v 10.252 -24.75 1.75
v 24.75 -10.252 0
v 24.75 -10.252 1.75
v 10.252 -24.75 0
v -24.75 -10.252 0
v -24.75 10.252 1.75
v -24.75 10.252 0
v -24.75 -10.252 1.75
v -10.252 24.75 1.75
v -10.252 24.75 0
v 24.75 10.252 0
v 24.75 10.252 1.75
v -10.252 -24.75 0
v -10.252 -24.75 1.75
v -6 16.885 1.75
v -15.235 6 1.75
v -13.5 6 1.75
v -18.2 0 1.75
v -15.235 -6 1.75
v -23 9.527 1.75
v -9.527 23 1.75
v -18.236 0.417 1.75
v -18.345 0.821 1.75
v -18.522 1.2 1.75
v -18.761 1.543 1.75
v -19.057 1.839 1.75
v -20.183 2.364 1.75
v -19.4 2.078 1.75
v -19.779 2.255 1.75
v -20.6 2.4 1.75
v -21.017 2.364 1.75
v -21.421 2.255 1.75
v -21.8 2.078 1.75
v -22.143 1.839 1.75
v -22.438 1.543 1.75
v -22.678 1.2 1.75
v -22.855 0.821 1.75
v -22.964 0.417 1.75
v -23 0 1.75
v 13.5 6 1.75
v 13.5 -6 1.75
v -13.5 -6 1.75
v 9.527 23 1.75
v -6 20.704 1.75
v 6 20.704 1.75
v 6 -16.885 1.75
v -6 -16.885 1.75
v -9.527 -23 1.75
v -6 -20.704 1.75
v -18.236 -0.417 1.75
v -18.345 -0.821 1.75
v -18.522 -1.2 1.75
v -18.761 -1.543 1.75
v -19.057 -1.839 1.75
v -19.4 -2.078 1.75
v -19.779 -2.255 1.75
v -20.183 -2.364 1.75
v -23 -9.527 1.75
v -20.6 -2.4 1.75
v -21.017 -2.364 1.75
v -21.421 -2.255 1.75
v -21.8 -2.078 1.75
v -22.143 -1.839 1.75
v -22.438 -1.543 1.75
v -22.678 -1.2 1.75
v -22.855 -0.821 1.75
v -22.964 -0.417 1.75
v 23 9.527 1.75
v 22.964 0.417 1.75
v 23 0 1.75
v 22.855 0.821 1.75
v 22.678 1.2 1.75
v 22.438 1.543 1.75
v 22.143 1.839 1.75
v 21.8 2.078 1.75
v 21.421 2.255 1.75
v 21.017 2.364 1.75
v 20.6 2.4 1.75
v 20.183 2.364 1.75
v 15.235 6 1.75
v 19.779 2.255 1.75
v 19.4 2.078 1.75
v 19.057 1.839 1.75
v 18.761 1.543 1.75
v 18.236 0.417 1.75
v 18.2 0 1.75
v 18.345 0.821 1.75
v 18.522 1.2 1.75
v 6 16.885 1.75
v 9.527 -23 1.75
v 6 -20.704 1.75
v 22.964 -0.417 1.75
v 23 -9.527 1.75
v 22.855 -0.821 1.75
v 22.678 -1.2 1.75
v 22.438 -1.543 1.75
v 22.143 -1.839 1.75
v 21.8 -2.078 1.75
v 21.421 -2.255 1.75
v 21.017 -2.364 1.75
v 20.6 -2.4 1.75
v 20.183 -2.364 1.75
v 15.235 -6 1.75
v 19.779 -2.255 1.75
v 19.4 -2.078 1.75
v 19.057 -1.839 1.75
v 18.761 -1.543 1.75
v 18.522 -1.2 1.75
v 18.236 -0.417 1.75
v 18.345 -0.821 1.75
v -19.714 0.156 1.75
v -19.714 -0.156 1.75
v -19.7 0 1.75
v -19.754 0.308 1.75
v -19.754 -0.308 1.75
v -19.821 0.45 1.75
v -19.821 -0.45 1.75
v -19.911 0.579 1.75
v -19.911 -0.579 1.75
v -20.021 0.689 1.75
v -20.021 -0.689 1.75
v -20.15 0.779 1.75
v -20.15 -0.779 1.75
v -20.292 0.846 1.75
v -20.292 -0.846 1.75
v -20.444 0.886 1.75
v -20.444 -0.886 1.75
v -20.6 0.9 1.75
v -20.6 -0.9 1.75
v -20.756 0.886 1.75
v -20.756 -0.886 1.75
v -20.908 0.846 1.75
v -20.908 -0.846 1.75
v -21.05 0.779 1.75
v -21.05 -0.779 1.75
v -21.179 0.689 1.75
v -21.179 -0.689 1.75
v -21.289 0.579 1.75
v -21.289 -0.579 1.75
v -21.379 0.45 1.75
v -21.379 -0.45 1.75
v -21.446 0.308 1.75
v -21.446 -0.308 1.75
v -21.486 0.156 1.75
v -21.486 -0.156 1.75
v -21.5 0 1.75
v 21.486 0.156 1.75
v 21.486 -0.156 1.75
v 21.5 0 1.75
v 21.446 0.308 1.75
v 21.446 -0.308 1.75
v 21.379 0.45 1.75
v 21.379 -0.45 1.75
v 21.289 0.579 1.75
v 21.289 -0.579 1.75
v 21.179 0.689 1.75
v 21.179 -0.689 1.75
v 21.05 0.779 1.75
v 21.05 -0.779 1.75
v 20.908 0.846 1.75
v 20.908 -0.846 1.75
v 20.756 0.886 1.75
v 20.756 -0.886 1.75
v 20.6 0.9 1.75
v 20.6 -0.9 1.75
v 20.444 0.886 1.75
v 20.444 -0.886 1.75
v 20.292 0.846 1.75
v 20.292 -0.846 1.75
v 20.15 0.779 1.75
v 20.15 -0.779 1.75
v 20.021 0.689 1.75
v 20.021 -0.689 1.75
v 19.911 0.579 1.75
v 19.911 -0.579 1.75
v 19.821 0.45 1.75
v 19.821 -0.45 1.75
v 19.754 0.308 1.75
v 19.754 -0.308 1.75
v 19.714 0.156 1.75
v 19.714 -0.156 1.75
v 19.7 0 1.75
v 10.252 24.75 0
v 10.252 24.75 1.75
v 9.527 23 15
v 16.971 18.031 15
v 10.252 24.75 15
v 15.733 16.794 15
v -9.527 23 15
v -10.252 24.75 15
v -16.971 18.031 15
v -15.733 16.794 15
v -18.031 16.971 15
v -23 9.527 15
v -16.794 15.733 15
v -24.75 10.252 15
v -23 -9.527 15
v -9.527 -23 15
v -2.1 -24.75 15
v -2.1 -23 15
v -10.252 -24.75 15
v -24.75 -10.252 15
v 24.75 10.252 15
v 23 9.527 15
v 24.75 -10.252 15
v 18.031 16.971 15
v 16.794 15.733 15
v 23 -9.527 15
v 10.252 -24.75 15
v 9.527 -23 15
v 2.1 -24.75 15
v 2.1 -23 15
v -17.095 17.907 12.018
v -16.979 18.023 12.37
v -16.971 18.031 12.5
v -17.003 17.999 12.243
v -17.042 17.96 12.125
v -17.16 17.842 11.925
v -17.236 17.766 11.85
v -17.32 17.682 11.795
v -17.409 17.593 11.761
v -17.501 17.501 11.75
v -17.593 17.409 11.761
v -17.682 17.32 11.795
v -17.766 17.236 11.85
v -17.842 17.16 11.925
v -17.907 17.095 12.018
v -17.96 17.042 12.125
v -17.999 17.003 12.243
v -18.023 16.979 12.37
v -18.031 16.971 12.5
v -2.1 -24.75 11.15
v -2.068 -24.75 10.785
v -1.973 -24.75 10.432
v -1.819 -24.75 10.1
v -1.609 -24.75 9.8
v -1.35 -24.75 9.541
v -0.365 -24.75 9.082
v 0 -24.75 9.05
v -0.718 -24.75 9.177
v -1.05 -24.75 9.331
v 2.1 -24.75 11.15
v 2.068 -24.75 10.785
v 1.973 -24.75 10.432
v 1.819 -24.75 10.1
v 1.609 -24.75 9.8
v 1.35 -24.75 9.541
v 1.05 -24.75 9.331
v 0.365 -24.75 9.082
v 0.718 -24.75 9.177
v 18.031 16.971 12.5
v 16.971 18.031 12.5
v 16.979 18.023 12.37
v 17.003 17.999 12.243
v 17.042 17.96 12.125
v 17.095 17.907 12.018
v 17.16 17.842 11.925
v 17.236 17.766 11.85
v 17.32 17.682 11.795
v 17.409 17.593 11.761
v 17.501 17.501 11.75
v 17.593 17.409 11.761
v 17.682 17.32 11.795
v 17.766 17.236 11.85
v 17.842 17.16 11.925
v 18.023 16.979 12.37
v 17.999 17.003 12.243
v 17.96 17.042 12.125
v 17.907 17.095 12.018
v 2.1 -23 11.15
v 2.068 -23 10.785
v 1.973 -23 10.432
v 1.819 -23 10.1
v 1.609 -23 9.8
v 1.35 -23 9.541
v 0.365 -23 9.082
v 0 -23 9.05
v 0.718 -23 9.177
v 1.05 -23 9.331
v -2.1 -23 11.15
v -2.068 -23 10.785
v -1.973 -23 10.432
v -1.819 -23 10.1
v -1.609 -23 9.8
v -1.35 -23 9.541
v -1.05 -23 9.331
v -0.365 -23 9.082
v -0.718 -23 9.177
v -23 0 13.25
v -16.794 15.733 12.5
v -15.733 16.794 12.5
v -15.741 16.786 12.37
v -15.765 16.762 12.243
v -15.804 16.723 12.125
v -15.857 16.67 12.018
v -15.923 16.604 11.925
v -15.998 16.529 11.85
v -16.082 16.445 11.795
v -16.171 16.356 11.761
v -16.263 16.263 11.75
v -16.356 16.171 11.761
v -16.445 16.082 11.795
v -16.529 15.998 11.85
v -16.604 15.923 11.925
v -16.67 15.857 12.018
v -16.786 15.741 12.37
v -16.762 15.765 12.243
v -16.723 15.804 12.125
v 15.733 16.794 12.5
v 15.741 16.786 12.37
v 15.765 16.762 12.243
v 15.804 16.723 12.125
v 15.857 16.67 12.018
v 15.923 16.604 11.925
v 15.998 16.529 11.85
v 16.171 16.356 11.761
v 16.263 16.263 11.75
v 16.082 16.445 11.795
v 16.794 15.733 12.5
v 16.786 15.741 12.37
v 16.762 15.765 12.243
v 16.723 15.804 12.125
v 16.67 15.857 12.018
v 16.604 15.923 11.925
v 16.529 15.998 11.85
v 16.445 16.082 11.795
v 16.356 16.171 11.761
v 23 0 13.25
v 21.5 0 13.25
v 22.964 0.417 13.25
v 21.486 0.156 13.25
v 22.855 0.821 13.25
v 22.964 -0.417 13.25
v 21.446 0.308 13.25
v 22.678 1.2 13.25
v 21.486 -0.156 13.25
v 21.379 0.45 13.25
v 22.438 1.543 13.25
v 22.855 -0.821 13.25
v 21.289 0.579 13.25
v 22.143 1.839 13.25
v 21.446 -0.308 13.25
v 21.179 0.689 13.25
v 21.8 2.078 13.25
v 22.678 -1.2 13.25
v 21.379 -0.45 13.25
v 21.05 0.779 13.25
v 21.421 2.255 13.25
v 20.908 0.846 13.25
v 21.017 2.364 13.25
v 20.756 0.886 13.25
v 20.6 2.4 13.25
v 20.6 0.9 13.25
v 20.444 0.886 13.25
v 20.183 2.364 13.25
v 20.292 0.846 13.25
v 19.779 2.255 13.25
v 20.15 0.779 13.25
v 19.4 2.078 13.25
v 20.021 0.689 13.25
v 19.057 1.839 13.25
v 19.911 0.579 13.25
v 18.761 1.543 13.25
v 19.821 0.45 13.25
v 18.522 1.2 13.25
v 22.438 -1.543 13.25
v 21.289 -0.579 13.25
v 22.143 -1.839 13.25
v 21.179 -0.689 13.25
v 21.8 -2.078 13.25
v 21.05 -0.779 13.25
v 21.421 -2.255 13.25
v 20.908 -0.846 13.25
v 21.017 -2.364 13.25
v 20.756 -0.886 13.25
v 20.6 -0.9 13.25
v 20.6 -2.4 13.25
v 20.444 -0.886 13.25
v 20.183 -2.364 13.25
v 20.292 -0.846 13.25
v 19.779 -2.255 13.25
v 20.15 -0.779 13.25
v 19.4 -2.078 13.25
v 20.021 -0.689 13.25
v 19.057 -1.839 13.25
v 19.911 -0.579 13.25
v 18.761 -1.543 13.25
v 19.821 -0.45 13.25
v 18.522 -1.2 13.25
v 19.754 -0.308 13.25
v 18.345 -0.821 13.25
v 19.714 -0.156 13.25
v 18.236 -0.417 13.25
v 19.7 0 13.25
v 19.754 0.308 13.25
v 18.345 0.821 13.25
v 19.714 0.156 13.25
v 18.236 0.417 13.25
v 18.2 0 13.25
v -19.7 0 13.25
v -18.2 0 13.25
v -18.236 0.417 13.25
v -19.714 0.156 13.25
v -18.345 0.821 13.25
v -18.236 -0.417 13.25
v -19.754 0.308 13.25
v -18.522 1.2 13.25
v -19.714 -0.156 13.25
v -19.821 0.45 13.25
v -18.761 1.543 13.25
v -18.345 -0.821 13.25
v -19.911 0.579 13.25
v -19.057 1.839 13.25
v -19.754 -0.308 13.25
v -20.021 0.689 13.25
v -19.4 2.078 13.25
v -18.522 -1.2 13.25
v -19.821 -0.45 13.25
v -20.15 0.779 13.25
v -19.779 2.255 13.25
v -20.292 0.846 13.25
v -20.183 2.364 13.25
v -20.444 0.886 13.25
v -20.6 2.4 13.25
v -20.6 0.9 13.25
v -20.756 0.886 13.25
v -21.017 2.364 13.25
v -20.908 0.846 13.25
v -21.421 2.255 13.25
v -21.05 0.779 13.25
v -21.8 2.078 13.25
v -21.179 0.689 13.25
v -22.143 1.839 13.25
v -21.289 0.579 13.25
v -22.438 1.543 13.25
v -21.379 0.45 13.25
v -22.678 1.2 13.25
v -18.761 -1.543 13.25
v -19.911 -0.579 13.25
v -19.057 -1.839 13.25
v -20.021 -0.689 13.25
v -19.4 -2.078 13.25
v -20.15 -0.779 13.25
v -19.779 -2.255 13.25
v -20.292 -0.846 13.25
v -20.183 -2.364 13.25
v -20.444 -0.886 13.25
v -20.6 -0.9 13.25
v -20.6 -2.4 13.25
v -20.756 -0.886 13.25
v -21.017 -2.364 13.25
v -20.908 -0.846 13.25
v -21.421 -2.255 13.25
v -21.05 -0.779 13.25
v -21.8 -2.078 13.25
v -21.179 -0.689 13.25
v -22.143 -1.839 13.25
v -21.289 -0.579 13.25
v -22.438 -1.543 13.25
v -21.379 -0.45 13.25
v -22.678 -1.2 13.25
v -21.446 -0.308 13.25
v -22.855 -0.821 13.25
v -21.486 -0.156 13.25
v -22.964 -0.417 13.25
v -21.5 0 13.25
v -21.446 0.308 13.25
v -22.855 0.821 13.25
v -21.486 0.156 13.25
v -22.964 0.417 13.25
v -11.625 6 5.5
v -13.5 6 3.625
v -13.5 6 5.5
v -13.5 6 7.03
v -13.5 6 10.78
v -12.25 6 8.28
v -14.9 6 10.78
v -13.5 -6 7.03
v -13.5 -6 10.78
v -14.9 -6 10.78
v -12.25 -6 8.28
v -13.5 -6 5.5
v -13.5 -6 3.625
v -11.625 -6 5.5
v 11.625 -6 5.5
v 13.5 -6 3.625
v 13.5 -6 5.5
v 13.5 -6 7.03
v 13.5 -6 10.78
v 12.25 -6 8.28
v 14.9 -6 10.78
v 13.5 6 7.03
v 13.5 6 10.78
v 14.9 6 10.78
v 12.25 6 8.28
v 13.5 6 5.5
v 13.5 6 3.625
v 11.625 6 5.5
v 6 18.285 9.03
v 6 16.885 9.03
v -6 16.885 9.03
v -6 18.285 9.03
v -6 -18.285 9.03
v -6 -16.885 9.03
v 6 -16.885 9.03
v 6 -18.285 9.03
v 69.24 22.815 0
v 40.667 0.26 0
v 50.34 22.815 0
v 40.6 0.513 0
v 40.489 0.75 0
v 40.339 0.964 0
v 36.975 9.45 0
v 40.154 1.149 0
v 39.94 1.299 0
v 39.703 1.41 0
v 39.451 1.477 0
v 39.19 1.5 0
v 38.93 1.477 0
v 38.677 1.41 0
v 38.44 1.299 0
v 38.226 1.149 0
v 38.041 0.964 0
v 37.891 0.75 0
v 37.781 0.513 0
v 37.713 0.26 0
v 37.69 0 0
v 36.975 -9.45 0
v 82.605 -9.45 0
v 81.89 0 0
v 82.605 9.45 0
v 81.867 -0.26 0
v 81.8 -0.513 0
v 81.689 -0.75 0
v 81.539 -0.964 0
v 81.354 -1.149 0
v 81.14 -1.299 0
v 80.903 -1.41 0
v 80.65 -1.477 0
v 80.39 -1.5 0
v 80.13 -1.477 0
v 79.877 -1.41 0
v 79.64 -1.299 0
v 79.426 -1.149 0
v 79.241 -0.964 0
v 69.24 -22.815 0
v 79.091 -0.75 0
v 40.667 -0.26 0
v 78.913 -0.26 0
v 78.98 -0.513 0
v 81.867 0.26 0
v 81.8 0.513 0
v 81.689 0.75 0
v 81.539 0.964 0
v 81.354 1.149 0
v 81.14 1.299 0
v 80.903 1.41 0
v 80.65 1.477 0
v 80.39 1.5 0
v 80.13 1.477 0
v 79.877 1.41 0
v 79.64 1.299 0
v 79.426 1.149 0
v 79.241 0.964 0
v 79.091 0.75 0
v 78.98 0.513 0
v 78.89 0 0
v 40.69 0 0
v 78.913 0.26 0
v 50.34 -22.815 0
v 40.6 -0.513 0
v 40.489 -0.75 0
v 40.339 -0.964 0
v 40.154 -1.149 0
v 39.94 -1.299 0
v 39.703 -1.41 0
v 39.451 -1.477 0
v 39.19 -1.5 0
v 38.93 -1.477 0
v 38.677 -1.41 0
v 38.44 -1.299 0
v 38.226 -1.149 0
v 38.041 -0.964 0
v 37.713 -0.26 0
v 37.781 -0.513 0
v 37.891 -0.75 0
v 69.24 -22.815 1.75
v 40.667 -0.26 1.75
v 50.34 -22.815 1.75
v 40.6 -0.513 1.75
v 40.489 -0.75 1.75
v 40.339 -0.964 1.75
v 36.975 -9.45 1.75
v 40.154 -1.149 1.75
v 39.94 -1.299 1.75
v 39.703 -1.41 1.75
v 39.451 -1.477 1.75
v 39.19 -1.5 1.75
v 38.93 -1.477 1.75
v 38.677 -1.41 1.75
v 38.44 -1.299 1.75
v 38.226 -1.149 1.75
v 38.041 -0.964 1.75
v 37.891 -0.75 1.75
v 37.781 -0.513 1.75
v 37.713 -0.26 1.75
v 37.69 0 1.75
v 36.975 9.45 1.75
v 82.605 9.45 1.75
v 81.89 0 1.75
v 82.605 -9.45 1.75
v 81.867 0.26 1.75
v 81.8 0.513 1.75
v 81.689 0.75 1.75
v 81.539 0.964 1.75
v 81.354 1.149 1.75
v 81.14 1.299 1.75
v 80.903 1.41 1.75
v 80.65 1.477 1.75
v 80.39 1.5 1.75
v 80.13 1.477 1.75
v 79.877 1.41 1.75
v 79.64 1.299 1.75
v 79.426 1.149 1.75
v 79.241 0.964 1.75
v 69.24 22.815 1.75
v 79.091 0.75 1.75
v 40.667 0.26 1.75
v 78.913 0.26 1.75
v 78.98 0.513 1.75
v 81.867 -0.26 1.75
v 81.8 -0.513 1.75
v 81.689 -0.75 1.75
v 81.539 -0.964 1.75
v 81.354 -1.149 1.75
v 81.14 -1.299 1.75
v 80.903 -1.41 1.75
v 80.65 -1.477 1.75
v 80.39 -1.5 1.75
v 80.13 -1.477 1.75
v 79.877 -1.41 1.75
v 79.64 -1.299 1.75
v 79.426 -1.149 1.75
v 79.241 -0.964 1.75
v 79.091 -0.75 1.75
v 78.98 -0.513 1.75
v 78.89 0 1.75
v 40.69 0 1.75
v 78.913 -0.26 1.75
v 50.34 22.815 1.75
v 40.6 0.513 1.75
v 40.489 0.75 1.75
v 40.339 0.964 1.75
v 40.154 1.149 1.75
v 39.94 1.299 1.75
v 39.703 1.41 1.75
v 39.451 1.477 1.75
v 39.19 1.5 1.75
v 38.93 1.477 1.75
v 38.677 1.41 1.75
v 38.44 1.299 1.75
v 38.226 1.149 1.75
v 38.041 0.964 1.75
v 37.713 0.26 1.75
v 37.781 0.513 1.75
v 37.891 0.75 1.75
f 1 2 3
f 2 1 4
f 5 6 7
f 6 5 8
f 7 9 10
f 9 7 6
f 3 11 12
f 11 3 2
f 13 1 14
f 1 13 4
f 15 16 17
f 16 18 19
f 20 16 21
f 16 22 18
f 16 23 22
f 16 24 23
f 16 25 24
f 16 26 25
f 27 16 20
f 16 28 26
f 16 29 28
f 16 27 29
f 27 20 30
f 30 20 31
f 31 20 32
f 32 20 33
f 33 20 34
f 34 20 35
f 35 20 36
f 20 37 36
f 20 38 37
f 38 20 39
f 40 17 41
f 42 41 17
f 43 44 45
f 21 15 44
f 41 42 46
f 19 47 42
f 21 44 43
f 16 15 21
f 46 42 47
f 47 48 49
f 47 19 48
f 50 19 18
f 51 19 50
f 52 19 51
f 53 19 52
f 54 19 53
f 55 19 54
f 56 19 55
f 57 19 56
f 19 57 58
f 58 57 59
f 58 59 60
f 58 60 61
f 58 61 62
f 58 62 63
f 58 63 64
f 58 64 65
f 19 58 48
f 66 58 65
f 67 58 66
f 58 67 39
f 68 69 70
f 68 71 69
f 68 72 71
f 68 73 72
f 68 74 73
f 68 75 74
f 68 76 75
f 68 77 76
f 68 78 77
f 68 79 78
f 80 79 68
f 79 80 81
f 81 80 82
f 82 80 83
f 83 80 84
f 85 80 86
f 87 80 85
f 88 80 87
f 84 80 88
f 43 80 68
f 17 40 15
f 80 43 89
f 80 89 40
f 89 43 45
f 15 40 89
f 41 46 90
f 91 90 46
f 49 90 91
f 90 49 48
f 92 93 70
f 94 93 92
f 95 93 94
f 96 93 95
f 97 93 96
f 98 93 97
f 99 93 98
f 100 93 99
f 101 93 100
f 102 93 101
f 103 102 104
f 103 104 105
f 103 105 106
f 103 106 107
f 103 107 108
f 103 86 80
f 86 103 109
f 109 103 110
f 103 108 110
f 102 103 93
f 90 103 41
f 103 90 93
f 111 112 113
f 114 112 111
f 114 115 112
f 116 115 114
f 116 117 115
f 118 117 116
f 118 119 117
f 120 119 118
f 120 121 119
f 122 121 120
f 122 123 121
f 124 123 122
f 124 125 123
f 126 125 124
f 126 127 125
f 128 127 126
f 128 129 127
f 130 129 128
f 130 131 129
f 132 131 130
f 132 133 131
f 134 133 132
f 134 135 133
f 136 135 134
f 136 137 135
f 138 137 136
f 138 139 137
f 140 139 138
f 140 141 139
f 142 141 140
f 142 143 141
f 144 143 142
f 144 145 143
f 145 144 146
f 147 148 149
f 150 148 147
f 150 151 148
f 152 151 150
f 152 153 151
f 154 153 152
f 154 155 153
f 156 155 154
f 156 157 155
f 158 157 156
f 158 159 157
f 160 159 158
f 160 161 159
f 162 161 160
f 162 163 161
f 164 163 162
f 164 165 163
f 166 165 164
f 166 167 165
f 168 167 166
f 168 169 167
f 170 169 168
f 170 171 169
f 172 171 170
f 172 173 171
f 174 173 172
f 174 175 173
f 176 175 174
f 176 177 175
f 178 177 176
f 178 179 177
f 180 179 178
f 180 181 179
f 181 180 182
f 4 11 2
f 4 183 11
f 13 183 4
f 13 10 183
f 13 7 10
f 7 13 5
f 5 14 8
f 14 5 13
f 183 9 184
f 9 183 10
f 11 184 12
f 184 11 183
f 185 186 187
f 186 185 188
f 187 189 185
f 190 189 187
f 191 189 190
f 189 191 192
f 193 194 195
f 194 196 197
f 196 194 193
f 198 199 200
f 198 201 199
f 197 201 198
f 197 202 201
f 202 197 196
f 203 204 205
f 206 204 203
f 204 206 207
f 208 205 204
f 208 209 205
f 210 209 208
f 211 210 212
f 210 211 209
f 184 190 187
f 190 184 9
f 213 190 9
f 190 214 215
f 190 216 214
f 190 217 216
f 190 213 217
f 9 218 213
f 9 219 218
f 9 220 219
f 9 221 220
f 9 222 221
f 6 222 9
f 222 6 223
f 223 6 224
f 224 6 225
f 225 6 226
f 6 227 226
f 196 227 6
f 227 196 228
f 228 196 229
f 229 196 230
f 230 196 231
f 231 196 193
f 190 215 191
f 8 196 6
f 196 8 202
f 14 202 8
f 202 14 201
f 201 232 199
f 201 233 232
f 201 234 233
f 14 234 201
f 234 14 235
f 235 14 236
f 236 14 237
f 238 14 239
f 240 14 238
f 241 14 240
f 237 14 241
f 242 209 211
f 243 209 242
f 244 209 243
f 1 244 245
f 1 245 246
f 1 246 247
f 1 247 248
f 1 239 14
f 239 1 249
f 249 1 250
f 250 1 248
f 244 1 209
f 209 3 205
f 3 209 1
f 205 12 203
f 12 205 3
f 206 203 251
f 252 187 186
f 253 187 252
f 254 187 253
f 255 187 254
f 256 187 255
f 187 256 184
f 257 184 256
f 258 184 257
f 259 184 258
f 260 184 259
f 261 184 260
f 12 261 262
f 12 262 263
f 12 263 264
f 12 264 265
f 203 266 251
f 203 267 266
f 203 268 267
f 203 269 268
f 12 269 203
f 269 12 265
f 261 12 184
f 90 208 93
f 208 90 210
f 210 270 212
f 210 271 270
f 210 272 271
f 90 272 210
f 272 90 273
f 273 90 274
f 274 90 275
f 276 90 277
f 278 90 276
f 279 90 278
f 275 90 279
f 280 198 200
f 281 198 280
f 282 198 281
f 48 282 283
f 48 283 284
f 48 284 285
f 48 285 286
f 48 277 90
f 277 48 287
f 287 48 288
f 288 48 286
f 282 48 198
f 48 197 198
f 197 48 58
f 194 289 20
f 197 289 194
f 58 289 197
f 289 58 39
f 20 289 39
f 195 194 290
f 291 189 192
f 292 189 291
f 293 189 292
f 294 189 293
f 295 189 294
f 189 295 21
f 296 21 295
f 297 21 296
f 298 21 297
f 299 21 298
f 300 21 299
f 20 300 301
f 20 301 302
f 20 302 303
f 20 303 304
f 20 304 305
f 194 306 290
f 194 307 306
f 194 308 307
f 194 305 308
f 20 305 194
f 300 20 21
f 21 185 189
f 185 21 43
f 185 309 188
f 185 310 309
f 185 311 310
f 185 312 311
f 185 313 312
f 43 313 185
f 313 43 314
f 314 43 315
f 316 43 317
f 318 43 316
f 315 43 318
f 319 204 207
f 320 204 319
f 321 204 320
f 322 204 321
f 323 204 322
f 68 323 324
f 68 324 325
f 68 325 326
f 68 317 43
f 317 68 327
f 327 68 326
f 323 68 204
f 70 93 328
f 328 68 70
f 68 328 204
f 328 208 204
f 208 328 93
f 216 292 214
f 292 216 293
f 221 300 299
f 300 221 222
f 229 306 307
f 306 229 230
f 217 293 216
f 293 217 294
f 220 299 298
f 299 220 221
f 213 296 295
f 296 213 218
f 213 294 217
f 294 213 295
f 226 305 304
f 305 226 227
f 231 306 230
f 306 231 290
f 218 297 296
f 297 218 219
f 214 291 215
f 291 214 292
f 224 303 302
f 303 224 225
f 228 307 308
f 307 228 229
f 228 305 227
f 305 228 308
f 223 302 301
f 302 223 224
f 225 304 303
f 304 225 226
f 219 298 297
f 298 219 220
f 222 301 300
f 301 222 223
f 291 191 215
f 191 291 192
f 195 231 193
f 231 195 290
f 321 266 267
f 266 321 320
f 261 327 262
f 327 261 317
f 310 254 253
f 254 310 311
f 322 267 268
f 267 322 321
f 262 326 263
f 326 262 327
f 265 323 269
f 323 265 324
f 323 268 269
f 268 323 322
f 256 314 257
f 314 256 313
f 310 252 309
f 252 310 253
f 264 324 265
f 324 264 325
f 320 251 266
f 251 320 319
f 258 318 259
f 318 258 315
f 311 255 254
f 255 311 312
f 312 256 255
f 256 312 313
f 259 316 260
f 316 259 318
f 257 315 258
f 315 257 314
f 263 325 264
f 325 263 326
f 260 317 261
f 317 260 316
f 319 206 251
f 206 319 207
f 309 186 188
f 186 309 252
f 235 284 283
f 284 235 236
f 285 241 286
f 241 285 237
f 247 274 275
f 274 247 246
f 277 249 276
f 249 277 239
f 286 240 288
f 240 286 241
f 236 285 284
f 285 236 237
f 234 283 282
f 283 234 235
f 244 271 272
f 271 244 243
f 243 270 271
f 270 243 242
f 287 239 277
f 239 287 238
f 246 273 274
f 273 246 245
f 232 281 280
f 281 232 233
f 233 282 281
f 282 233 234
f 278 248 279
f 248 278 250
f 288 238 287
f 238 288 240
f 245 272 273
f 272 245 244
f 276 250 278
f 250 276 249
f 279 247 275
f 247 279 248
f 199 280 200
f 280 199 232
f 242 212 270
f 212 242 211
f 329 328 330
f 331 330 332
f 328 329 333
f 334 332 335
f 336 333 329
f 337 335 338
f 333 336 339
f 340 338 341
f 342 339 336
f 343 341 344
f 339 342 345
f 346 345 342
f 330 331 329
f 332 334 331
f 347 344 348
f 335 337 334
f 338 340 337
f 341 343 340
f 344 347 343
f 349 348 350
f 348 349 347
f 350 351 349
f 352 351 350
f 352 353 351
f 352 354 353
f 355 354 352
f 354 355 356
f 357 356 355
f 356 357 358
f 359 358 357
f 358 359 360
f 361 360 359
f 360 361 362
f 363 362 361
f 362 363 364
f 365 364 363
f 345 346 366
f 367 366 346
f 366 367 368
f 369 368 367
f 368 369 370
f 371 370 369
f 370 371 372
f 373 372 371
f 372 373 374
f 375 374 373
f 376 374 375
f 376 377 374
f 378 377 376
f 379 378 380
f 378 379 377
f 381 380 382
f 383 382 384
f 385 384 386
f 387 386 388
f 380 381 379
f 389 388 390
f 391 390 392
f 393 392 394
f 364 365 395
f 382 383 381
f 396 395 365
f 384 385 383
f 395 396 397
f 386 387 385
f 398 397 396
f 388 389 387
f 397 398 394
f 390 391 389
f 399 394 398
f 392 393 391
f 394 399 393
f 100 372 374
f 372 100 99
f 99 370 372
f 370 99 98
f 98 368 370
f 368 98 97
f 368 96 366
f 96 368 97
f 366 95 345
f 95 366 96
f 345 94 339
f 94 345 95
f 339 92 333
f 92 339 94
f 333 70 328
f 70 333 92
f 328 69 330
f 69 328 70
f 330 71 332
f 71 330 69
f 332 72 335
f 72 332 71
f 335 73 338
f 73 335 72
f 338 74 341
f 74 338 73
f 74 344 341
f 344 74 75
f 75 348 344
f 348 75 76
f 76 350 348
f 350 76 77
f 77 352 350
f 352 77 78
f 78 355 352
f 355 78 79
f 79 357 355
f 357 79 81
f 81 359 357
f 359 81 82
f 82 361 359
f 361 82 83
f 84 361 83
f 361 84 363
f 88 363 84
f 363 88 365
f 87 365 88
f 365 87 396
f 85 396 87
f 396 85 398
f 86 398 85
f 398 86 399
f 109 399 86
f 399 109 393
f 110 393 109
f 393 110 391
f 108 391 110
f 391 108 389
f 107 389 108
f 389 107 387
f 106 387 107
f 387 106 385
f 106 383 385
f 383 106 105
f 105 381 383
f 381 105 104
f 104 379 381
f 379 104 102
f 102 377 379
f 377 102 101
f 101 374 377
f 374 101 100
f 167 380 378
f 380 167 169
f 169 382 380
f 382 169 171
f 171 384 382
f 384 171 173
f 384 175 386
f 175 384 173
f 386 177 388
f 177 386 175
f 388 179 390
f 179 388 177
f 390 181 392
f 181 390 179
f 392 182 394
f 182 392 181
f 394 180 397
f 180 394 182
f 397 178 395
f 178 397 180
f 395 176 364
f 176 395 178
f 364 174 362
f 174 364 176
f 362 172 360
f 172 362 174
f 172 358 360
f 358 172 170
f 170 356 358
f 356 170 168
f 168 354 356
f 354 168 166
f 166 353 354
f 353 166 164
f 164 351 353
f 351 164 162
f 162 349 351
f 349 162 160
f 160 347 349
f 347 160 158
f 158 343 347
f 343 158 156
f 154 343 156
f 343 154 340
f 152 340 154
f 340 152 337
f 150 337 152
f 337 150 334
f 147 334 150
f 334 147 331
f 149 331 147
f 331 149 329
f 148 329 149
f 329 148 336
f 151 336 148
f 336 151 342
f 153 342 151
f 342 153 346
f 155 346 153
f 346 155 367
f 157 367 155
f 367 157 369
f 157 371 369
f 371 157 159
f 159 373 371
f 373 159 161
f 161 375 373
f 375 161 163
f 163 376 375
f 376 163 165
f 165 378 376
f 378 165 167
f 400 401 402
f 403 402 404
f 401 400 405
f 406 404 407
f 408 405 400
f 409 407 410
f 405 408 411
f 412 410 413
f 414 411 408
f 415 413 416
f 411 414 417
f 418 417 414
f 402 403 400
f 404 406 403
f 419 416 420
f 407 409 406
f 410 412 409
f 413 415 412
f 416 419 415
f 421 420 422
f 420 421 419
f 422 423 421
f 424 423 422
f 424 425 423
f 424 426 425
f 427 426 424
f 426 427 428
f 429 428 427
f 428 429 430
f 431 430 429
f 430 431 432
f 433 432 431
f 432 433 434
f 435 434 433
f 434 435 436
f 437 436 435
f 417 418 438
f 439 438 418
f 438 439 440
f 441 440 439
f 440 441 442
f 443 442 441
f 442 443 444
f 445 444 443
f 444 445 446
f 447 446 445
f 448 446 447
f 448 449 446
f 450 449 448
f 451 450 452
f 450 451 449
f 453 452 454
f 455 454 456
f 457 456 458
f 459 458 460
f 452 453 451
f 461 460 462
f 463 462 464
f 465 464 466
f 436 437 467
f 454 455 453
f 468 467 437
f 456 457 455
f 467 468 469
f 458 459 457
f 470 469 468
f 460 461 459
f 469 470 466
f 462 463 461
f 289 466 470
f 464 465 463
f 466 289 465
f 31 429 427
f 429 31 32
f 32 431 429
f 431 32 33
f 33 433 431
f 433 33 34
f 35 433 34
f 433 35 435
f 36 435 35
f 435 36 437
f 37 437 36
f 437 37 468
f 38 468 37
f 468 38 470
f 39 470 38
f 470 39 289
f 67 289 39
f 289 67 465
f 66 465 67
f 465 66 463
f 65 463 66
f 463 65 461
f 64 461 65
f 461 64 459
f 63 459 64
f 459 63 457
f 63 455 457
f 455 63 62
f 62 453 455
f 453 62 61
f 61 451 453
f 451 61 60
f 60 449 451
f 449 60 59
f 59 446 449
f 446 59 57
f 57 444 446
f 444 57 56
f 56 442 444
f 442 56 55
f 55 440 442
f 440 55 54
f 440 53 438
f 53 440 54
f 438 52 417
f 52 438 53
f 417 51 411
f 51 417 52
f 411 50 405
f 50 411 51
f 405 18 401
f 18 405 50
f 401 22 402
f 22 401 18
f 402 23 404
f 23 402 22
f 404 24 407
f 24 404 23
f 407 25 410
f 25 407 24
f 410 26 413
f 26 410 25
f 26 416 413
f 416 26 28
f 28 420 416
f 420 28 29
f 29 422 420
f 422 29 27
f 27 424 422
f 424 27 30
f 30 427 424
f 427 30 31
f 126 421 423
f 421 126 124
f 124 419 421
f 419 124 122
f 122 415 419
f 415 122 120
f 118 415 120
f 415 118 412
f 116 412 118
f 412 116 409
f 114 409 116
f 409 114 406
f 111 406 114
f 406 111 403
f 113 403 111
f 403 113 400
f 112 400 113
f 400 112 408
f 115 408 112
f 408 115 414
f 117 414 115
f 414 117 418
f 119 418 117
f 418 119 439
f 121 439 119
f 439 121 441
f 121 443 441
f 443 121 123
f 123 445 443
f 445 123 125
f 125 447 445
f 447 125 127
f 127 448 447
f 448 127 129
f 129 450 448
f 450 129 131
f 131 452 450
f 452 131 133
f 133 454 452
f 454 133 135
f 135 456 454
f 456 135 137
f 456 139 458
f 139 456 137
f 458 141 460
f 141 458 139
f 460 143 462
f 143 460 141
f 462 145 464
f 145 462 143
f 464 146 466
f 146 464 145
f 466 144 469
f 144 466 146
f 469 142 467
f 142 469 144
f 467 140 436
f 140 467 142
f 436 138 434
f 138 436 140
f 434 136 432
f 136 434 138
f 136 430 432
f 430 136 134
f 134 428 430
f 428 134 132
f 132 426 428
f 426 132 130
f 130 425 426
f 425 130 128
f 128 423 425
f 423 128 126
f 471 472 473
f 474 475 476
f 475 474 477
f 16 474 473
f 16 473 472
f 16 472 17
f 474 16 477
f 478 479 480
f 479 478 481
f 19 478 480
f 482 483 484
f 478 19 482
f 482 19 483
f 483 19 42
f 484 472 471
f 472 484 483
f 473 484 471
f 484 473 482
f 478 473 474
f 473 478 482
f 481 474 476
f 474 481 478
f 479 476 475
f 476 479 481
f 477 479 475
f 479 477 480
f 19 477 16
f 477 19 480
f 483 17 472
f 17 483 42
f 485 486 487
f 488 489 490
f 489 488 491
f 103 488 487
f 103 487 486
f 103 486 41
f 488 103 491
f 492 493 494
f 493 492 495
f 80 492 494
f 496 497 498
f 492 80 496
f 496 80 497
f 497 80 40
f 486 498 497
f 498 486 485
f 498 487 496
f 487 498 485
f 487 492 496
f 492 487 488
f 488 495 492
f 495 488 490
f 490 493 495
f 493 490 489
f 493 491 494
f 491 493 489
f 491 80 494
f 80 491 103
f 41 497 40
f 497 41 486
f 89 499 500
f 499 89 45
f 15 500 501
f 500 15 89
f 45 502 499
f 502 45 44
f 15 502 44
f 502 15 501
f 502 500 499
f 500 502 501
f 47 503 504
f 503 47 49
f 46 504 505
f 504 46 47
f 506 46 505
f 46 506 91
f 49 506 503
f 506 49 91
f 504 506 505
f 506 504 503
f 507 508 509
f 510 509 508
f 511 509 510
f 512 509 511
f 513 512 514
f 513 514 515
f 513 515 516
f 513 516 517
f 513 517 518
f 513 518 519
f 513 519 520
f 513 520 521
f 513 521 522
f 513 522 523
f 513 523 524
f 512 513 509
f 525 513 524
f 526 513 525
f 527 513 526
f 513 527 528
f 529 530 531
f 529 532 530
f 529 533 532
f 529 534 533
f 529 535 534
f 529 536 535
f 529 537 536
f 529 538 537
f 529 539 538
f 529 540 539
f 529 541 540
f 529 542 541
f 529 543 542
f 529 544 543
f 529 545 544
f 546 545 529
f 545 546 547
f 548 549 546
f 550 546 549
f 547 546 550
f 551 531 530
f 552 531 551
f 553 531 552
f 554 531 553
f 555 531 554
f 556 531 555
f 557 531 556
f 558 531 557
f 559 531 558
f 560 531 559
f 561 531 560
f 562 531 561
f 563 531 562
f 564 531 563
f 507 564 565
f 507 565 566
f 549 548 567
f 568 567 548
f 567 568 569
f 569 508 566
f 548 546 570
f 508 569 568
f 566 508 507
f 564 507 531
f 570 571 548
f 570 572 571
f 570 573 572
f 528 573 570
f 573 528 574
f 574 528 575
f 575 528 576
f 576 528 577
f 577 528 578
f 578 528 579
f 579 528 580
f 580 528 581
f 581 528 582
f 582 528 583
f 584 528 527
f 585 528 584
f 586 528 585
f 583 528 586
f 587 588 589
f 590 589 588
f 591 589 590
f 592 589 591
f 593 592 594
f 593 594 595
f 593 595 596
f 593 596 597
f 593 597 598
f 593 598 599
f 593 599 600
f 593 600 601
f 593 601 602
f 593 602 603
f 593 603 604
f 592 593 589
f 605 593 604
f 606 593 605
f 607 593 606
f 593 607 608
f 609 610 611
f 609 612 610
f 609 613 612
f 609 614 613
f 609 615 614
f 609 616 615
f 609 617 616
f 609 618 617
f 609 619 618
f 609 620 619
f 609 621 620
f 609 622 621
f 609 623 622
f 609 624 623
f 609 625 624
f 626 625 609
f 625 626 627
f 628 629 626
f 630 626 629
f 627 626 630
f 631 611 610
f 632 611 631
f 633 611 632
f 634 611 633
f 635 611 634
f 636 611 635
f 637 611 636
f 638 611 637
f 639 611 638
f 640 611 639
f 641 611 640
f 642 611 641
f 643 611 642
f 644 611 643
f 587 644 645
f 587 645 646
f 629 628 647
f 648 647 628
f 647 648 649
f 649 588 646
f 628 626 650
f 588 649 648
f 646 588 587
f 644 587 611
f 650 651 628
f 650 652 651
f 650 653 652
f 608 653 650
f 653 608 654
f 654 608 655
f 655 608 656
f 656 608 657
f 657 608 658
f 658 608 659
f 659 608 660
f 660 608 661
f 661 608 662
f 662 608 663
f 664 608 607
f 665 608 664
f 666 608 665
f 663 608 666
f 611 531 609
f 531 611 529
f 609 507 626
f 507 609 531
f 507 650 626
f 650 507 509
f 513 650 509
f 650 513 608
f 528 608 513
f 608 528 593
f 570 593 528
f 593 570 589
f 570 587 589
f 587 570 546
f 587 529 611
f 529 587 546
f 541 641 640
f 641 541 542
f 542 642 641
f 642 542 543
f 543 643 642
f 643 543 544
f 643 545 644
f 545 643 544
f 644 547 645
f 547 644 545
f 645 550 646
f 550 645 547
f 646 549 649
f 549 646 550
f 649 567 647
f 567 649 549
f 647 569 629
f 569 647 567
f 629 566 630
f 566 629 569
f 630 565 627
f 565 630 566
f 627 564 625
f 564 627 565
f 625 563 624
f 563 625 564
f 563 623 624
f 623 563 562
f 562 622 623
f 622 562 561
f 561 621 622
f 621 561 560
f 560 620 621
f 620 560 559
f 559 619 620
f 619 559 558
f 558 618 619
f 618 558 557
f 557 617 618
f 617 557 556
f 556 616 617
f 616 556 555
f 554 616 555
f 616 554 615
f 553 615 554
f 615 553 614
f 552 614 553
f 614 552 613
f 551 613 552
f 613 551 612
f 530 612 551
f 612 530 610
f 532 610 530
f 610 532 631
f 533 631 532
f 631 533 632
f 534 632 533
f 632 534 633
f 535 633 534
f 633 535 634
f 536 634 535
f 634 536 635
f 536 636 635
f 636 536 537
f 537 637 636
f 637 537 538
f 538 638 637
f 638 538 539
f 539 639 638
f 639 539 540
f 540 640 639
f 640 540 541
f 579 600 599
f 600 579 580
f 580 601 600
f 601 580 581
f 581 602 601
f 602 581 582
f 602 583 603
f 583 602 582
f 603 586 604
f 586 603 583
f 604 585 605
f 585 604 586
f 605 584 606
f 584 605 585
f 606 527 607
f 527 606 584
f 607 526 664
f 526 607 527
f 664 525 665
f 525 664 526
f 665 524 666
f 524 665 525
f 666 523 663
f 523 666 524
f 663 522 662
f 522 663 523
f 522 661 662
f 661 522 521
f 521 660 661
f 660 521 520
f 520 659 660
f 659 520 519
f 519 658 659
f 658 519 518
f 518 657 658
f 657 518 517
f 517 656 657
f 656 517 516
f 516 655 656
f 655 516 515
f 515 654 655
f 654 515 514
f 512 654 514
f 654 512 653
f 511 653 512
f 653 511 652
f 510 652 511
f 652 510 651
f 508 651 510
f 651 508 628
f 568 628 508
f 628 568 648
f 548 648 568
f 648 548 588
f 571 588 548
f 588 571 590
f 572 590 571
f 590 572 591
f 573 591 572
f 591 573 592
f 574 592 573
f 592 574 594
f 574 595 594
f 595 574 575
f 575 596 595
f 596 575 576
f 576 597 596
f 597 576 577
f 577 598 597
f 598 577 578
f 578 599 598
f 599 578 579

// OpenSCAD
includeLid = true;
includeBox = true;

snapSpacing = 27;
pcbLength = 33.77;
pcbThickness = 1.53;

offsetFromBase = 3.75;
offsetFromTop = 10;
wall = 1.75;
bottomHeight = 15;
lidTolerance = 0.4;

outDiameter = 1.5;
inDiameter = 4.2;

sides = 8;
size = 46;
outAngle = 90;

snapWidth = 12;
snapThickness = 1.4;
snapStickout = 1.25;
extraThicknessSnap = 0.4;
extraThicknessHolder = 3;
extraHeight = 2;

screwDiameter = 1.8;
screwOuterDiameter = 3;
screwPostWall = 1.5;

module snap(snapStickout=snapStickout,baseExtra=0,heightExtra=0) {
    height = wall + offsetFromBase + 2 * snapStickout;
    
    translate([0,snapWidth/2,0])
    rotate([90,0,0])
    linear_extrude(height=snapWidth)
    polygon([[-snapThickness-baseExtra,0],[0,0],[0,wall+offsetFromBase-1.5*snapStickout],[snapStickout*1.5,wall+offsetFromBase],[0,wall+offsetFromBase],[0,wall+offsetFromBase+pcbThickness],[snapStickout,wall+offsetFromBase+pcbThickness+snapStickout],[0,wall+offsetFromBase+pcbThickness+3*snapStickout],[0,wall+offsetFromBase+pcbThickness+3*snapStickout+heightExtra],[-snapThickness,wall+offsetFromBase+pcbThickness+3*snapStickout+heightExtra]]);
}

diameter = size / cos(180/sides);
adjWall = wall / cos(180/sides);
angle = 90+360/sides/2;

module box(height) {
    rotate(angle) {
    cylinder(d=diameter+adjWall*2,h=wall,$fn=sides);
    linear_extrude(height=height) {
        difference() {
            circle(d=diameter+adjWall*2,$fn=sides);
            circle(d=diameter,$fn=sides);
        }
    }
}
}

module hole(d) {
    l = size / 2;
    translate([0,size/2,bottomHeight-d/2-wall])
    rotate([90,0,0]) {
    translate([0,0,-l]) cylinder(d=d,h=2*l,$fn=36);
    translate([0,d/2+0.5+wall/2,0]) cube([d,d+wall+1,2*l],center=true);
    }
}

spd = screwDiameter+2*screwPostWall;
screwX = size/2-spd/2;

module bottom() {
    difference() {
        box(bottomHeight);
        rotate([0,0,outAngle/2]) hole(outDiameter);
        rotate([0,0,-outAngle/2]) hole(outDiameter);
        rotate([0,0,180]) hole(inDiameter);
    }
    translate([-snapSpacing/2,0,0]) snap(snapStickout,extraThicknessSnap);
    translate([snapSpacing/2,0,0]) rotate([0,0,180]) snap(snapStickout,extraThicknessSnap);
    translate([0,pcbLength/2,0]) rotate([0,0,-90]) snap(0,extraThicknessHolder,extraHeight);
    translate([0,-pcbLength/2,0]) rotate([0,0,90]) snap(0,extraThicknessHolder,extraHeight);
    for (angle=[0,180]) 
        rotate([0,0,angle]) {
        translate([screwX,0,0])
        linear_extrude(bottomHeight-wall) difference() {
            circle(d=spd,$fn=36);
            circle(d=screwDiameter,$fn=36);
        }
    }
}

module lid() {
    linear_extrude(height=wall)
    difference() {
        rotate(angle) circle(d=diameter-lidTolerance,$fn=sides);
        for (angle=[0,180]) 
            rotate(angle) {
            translate([screwX,0])
                circle(d=screwOuterDiameter,$fn=36);
        }
    }    
}

if (includeBox) bottom();
if (includeLid) translate([diameter+10,0,0]) lid();
